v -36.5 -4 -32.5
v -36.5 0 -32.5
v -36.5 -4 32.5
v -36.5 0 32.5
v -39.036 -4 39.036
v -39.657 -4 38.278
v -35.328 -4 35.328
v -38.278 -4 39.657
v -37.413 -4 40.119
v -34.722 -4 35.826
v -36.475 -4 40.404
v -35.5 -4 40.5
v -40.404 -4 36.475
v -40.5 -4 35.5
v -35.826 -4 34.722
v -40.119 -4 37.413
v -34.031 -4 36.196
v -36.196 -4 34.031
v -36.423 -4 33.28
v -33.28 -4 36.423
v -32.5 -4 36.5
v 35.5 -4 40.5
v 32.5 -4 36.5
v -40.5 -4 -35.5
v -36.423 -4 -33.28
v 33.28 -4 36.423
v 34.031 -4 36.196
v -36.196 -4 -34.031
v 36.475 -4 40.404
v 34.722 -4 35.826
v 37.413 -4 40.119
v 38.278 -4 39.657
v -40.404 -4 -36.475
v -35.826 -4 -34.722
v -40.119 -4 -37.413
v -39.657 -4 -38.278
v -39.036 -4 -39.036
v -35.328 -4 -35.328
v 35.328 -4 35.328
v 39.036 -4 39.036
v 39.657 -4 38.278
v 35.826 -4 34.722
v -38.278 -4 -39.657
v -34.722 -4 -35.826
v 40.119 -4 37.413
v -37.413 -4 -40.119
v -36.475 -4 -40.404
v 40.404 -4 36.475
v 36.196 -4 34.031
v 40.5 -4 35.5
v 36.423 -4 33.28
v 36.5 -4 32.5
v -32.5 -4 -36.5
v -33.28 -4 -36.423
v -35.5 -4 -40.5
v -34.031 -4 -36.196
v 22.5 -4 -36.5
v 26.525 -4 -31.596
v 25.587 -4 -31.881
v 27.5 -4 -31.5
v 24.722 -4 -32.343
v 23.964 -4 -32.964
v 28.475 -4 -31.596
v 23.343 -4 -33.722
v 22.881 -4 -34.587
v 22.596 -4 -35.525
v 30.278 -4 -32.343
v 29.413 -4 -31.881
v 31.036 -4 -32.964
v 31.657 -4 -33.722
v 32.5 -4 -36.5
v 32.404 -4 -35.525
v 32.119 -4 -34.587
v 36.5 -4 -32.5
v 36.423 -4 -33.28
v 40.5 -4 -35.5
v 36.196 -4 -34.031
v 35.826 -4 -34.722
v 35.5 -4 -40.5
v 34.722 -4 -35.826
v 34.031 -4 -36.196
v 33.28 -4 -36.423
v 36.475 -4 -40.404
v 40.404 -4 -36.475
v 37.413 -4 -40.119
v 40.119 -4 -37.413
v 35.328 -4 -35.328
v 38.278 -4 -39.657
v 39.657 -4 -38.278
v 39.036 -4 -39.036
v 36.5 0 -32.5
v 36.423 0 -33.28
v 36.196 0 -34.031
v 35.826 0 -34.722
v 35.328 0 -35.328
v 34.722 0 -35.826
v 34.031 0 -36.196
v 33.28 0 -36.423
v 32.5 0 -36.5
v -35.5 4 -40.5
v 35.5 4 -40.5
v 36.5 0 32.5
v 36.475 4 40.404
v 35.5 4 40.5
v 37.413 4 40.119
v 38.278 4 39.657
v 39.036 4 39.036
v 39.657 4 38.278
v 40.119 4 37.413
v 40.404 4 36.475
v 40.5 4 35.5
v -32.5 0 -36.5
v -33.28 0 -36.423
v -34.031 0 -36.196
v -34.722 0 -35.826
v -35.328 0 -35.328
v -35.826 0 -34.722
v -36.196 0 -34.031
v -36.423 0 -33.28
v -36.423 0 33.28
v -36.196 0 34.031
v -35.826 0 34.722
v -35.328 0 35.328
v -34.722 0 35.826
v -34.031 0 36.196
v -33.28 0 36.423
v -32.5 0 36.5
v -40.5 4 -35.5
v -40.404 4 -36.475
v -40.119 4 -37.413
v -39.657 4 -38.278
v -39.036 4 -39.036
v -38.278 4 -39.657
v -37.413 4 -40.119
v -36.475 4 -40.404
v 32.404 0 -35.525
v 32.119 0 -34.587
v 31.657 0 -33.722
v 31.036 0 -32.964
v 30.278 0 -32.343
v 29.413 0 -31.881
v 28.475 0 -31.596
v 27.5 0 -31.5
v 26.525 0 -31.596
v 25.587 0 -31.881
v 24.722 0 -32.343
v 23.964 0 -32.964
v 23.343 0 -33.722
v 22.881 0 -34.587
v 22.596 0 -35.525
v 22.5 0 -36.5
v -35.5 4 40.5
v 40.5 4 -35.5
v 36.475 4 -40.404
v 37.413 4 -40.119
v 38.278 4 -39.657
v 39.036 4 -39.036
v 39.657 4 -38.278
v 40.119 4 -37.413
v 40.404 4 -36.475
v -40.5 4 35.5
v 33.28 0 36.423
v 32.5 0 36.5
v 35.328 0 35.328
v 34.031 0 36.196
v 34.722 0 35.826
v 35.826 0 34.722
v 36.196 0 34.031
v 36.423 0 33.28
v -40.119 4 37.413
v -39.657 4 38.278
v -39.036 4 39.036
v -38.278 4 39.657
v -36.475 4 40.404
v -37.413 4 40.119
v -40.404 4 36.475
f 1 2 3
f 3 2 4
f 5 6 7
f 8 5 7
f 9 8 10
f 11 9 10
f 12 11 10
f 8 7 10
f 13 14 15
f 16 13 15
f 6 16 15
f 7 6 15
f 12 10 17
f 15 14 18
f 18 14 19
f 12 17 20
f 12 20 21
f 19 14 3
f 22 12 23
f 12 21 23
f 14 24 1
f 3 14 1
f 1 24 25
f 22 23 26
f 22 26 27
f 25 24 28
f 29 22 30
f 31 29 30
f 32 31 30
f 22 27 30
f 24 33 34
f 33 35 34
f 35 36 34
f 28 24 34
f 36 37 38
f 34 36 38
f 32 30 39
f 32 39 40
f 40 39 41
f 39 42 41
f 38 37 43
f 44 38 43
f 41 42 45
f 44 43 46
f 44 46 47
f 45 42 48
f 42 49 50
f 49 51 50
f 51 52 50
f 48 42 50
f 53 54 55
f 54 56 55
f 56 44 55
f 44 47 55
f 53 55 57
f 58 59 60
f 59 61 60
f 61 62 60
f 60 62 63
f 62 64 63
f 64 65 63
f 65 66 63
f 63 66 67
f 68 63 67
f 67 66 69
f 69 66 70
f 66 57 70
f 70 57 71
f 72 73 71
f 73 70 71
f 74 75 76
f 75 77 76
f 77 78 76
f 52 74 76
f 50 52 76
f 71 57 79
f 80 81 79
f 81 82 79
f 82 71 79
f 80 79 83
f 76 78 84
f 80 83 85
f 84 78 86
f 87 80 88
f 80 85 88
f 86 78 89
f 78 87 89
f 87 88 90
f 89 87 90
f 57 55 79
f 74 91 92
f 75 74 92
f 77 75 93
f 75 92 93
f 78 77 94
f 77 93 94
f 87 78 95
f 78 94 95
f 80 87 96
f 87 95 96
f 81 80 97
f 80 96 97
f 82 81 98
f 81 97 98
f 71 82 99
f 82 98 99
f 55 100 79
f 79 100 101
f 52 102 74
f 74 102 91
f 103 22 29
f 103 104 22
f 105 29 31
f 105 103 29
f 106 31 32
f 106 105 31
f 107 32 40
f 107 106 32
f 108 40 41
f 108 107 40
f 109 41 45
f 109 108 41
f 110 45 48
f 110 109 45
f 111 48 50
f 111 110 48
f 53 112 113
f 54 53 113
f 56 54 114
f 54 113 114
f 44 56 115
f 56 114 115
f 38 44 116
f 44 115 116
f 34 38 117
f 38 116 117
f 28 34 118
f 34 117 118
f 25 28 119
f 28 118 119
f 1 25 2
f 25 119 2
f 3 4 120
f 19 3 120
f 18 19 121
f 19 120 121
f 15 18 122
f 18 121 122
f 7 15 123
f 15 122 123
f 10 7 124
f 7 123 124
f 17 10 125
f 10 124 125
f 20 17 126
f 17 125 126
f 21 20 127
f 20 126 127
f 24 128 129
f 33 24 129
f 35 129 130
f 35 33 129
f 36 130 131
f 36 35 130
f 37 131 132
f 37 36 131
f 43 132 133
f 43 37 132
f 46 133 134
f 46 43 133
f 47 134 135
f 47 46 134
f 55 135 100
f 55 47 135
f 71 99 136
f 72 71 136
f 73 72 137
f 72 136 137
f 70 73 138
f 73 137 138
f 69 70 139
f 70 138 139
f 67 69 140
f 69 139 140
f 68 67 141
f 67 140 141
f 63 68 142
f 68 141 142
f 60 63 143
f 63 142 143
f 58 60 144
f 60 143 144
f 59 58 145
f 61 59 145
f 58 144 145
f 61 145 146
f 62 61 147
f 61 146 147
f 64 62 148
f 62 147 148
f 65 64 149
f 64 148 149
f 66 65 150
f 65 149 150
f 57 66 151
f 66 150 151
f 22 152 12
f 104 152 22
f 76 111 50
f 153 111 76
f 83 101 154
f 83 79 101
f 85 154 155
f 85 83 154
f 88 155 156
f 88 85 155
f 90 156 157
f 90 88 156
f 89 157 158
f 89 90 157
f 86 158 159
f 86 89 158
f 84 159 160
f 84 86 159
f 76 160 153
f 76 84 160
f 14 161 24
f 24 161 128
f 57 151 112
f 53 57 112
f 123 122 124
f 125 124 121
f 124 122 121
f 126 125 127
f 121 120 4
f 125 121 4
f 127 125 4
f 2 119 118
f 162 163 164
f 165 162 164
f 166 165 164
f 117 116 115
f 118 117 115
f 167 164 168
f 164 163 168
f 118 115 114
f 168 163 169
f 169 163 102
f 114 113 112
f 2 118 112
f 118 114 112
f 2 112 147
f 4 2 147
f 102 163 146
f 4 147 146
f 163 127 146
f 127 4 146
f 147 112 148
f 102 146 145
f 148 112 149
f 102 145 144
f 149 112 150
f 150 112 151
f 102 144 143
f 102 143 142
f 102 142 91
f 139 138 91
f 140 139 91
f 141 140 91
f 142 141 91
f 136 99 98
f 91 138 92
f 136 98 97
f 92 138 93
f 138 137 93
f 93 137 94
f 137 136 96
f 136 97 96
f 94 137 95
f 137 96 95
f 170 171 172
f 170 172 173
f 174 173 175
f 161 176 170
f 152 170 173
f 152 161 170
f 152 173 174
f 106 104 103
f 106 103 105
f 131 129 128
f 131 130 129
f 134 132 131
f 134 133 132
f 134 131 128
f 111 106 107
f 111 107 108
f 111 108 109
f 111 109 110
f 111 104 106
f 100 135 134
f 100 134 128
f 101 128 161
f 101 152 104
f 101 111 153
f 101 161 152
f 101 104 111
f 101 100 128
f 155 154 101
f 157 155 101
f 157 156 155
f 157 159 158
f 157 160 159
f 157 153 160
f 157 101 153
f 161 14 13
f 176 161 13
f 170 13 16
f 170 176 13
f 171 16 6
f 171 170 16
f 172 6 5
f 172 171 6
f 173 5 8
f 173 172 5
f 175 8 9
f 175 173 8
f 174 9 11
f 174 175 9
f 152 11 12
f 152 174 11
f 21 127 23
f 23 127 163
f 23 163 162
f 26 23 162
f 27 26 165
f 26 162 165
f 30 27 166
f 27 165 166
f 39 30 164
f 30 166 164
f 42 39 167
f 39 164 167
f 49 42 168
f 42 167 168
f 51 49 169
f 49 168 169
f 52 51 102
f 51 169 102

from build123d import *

# Parameters (mm, degrees)
SKETCH2_W           = 81
SKETCH2_H           = 81
BOSS_EXTRUDE1_DEPTH = 4
CUT_EXTRUDE1_DEPTH  = 4
FILLET1_R           = 5


with BuildPart() as part:
    # Sketch2 → Boss-Extrude1 (new body, symmetric)
    with BuildSketch(Plane(origin=(0, 0, 0), x_dir=(1, 0, 0), z_dir=(0, 1, 0))):
        Rectangle(SKETCH2_W, SKETCH2_H)
    extrude(amount=BOSS_EXTRUDE1_DEPTH, both=True)

    # Sketch1 → Cut-Extrude1 (cut)
    with BuildSketch(Plane(origin=(0, 0, 0), x_dir=(1, 0, 0), z_dir=(0, 1, 0))):
        with BuildLine():
            Line((22.5, 36.5), (-32.5, 36.5))
            ThreePointArc((-32.5, 36.5), (-35.328427125, 35.328427125), (-36.5, 32.5))
            Line((-36.5, 32.5), (-36.5, -32.5))
            ThreePointArc((-36.5, -32.5), (-35.328427125, -35.328427125), (-32.5, -36.5))
            Line((-32.5, -36.5), (32.5, -36.5))
            ThreePointArc((32.5, -36.5), (35.328427125, -35.328427125), (36.5, -32.5))
            Line((36.5, -32.5), (36.5, 32.5))
            ThreePointArc((36.5, 32.5), (35.328427125, 35.328427125), (32.5, 36.5))
            ThreePointArc((32.5, 36.5), (27.5, 31.5), (22.5, 36.5))
        make_face()
    extrude(amount=-CUT_EXTRUDE1_DEPTH, mode=Mode.SUBTRACT)

    # Fillet1
    fillet1_edges = [part.edges().sort_by_distance(p)[0] for p in [
        (-40.5, 0, 40.5),
        (-40.5, 0, -40.5),
        (40.5, 0, -40.5),
        (40.5, 0, 40.5),
    ]]
    fillet(fillet1_edges, radius=FILLET1_R)


solid = part.part
